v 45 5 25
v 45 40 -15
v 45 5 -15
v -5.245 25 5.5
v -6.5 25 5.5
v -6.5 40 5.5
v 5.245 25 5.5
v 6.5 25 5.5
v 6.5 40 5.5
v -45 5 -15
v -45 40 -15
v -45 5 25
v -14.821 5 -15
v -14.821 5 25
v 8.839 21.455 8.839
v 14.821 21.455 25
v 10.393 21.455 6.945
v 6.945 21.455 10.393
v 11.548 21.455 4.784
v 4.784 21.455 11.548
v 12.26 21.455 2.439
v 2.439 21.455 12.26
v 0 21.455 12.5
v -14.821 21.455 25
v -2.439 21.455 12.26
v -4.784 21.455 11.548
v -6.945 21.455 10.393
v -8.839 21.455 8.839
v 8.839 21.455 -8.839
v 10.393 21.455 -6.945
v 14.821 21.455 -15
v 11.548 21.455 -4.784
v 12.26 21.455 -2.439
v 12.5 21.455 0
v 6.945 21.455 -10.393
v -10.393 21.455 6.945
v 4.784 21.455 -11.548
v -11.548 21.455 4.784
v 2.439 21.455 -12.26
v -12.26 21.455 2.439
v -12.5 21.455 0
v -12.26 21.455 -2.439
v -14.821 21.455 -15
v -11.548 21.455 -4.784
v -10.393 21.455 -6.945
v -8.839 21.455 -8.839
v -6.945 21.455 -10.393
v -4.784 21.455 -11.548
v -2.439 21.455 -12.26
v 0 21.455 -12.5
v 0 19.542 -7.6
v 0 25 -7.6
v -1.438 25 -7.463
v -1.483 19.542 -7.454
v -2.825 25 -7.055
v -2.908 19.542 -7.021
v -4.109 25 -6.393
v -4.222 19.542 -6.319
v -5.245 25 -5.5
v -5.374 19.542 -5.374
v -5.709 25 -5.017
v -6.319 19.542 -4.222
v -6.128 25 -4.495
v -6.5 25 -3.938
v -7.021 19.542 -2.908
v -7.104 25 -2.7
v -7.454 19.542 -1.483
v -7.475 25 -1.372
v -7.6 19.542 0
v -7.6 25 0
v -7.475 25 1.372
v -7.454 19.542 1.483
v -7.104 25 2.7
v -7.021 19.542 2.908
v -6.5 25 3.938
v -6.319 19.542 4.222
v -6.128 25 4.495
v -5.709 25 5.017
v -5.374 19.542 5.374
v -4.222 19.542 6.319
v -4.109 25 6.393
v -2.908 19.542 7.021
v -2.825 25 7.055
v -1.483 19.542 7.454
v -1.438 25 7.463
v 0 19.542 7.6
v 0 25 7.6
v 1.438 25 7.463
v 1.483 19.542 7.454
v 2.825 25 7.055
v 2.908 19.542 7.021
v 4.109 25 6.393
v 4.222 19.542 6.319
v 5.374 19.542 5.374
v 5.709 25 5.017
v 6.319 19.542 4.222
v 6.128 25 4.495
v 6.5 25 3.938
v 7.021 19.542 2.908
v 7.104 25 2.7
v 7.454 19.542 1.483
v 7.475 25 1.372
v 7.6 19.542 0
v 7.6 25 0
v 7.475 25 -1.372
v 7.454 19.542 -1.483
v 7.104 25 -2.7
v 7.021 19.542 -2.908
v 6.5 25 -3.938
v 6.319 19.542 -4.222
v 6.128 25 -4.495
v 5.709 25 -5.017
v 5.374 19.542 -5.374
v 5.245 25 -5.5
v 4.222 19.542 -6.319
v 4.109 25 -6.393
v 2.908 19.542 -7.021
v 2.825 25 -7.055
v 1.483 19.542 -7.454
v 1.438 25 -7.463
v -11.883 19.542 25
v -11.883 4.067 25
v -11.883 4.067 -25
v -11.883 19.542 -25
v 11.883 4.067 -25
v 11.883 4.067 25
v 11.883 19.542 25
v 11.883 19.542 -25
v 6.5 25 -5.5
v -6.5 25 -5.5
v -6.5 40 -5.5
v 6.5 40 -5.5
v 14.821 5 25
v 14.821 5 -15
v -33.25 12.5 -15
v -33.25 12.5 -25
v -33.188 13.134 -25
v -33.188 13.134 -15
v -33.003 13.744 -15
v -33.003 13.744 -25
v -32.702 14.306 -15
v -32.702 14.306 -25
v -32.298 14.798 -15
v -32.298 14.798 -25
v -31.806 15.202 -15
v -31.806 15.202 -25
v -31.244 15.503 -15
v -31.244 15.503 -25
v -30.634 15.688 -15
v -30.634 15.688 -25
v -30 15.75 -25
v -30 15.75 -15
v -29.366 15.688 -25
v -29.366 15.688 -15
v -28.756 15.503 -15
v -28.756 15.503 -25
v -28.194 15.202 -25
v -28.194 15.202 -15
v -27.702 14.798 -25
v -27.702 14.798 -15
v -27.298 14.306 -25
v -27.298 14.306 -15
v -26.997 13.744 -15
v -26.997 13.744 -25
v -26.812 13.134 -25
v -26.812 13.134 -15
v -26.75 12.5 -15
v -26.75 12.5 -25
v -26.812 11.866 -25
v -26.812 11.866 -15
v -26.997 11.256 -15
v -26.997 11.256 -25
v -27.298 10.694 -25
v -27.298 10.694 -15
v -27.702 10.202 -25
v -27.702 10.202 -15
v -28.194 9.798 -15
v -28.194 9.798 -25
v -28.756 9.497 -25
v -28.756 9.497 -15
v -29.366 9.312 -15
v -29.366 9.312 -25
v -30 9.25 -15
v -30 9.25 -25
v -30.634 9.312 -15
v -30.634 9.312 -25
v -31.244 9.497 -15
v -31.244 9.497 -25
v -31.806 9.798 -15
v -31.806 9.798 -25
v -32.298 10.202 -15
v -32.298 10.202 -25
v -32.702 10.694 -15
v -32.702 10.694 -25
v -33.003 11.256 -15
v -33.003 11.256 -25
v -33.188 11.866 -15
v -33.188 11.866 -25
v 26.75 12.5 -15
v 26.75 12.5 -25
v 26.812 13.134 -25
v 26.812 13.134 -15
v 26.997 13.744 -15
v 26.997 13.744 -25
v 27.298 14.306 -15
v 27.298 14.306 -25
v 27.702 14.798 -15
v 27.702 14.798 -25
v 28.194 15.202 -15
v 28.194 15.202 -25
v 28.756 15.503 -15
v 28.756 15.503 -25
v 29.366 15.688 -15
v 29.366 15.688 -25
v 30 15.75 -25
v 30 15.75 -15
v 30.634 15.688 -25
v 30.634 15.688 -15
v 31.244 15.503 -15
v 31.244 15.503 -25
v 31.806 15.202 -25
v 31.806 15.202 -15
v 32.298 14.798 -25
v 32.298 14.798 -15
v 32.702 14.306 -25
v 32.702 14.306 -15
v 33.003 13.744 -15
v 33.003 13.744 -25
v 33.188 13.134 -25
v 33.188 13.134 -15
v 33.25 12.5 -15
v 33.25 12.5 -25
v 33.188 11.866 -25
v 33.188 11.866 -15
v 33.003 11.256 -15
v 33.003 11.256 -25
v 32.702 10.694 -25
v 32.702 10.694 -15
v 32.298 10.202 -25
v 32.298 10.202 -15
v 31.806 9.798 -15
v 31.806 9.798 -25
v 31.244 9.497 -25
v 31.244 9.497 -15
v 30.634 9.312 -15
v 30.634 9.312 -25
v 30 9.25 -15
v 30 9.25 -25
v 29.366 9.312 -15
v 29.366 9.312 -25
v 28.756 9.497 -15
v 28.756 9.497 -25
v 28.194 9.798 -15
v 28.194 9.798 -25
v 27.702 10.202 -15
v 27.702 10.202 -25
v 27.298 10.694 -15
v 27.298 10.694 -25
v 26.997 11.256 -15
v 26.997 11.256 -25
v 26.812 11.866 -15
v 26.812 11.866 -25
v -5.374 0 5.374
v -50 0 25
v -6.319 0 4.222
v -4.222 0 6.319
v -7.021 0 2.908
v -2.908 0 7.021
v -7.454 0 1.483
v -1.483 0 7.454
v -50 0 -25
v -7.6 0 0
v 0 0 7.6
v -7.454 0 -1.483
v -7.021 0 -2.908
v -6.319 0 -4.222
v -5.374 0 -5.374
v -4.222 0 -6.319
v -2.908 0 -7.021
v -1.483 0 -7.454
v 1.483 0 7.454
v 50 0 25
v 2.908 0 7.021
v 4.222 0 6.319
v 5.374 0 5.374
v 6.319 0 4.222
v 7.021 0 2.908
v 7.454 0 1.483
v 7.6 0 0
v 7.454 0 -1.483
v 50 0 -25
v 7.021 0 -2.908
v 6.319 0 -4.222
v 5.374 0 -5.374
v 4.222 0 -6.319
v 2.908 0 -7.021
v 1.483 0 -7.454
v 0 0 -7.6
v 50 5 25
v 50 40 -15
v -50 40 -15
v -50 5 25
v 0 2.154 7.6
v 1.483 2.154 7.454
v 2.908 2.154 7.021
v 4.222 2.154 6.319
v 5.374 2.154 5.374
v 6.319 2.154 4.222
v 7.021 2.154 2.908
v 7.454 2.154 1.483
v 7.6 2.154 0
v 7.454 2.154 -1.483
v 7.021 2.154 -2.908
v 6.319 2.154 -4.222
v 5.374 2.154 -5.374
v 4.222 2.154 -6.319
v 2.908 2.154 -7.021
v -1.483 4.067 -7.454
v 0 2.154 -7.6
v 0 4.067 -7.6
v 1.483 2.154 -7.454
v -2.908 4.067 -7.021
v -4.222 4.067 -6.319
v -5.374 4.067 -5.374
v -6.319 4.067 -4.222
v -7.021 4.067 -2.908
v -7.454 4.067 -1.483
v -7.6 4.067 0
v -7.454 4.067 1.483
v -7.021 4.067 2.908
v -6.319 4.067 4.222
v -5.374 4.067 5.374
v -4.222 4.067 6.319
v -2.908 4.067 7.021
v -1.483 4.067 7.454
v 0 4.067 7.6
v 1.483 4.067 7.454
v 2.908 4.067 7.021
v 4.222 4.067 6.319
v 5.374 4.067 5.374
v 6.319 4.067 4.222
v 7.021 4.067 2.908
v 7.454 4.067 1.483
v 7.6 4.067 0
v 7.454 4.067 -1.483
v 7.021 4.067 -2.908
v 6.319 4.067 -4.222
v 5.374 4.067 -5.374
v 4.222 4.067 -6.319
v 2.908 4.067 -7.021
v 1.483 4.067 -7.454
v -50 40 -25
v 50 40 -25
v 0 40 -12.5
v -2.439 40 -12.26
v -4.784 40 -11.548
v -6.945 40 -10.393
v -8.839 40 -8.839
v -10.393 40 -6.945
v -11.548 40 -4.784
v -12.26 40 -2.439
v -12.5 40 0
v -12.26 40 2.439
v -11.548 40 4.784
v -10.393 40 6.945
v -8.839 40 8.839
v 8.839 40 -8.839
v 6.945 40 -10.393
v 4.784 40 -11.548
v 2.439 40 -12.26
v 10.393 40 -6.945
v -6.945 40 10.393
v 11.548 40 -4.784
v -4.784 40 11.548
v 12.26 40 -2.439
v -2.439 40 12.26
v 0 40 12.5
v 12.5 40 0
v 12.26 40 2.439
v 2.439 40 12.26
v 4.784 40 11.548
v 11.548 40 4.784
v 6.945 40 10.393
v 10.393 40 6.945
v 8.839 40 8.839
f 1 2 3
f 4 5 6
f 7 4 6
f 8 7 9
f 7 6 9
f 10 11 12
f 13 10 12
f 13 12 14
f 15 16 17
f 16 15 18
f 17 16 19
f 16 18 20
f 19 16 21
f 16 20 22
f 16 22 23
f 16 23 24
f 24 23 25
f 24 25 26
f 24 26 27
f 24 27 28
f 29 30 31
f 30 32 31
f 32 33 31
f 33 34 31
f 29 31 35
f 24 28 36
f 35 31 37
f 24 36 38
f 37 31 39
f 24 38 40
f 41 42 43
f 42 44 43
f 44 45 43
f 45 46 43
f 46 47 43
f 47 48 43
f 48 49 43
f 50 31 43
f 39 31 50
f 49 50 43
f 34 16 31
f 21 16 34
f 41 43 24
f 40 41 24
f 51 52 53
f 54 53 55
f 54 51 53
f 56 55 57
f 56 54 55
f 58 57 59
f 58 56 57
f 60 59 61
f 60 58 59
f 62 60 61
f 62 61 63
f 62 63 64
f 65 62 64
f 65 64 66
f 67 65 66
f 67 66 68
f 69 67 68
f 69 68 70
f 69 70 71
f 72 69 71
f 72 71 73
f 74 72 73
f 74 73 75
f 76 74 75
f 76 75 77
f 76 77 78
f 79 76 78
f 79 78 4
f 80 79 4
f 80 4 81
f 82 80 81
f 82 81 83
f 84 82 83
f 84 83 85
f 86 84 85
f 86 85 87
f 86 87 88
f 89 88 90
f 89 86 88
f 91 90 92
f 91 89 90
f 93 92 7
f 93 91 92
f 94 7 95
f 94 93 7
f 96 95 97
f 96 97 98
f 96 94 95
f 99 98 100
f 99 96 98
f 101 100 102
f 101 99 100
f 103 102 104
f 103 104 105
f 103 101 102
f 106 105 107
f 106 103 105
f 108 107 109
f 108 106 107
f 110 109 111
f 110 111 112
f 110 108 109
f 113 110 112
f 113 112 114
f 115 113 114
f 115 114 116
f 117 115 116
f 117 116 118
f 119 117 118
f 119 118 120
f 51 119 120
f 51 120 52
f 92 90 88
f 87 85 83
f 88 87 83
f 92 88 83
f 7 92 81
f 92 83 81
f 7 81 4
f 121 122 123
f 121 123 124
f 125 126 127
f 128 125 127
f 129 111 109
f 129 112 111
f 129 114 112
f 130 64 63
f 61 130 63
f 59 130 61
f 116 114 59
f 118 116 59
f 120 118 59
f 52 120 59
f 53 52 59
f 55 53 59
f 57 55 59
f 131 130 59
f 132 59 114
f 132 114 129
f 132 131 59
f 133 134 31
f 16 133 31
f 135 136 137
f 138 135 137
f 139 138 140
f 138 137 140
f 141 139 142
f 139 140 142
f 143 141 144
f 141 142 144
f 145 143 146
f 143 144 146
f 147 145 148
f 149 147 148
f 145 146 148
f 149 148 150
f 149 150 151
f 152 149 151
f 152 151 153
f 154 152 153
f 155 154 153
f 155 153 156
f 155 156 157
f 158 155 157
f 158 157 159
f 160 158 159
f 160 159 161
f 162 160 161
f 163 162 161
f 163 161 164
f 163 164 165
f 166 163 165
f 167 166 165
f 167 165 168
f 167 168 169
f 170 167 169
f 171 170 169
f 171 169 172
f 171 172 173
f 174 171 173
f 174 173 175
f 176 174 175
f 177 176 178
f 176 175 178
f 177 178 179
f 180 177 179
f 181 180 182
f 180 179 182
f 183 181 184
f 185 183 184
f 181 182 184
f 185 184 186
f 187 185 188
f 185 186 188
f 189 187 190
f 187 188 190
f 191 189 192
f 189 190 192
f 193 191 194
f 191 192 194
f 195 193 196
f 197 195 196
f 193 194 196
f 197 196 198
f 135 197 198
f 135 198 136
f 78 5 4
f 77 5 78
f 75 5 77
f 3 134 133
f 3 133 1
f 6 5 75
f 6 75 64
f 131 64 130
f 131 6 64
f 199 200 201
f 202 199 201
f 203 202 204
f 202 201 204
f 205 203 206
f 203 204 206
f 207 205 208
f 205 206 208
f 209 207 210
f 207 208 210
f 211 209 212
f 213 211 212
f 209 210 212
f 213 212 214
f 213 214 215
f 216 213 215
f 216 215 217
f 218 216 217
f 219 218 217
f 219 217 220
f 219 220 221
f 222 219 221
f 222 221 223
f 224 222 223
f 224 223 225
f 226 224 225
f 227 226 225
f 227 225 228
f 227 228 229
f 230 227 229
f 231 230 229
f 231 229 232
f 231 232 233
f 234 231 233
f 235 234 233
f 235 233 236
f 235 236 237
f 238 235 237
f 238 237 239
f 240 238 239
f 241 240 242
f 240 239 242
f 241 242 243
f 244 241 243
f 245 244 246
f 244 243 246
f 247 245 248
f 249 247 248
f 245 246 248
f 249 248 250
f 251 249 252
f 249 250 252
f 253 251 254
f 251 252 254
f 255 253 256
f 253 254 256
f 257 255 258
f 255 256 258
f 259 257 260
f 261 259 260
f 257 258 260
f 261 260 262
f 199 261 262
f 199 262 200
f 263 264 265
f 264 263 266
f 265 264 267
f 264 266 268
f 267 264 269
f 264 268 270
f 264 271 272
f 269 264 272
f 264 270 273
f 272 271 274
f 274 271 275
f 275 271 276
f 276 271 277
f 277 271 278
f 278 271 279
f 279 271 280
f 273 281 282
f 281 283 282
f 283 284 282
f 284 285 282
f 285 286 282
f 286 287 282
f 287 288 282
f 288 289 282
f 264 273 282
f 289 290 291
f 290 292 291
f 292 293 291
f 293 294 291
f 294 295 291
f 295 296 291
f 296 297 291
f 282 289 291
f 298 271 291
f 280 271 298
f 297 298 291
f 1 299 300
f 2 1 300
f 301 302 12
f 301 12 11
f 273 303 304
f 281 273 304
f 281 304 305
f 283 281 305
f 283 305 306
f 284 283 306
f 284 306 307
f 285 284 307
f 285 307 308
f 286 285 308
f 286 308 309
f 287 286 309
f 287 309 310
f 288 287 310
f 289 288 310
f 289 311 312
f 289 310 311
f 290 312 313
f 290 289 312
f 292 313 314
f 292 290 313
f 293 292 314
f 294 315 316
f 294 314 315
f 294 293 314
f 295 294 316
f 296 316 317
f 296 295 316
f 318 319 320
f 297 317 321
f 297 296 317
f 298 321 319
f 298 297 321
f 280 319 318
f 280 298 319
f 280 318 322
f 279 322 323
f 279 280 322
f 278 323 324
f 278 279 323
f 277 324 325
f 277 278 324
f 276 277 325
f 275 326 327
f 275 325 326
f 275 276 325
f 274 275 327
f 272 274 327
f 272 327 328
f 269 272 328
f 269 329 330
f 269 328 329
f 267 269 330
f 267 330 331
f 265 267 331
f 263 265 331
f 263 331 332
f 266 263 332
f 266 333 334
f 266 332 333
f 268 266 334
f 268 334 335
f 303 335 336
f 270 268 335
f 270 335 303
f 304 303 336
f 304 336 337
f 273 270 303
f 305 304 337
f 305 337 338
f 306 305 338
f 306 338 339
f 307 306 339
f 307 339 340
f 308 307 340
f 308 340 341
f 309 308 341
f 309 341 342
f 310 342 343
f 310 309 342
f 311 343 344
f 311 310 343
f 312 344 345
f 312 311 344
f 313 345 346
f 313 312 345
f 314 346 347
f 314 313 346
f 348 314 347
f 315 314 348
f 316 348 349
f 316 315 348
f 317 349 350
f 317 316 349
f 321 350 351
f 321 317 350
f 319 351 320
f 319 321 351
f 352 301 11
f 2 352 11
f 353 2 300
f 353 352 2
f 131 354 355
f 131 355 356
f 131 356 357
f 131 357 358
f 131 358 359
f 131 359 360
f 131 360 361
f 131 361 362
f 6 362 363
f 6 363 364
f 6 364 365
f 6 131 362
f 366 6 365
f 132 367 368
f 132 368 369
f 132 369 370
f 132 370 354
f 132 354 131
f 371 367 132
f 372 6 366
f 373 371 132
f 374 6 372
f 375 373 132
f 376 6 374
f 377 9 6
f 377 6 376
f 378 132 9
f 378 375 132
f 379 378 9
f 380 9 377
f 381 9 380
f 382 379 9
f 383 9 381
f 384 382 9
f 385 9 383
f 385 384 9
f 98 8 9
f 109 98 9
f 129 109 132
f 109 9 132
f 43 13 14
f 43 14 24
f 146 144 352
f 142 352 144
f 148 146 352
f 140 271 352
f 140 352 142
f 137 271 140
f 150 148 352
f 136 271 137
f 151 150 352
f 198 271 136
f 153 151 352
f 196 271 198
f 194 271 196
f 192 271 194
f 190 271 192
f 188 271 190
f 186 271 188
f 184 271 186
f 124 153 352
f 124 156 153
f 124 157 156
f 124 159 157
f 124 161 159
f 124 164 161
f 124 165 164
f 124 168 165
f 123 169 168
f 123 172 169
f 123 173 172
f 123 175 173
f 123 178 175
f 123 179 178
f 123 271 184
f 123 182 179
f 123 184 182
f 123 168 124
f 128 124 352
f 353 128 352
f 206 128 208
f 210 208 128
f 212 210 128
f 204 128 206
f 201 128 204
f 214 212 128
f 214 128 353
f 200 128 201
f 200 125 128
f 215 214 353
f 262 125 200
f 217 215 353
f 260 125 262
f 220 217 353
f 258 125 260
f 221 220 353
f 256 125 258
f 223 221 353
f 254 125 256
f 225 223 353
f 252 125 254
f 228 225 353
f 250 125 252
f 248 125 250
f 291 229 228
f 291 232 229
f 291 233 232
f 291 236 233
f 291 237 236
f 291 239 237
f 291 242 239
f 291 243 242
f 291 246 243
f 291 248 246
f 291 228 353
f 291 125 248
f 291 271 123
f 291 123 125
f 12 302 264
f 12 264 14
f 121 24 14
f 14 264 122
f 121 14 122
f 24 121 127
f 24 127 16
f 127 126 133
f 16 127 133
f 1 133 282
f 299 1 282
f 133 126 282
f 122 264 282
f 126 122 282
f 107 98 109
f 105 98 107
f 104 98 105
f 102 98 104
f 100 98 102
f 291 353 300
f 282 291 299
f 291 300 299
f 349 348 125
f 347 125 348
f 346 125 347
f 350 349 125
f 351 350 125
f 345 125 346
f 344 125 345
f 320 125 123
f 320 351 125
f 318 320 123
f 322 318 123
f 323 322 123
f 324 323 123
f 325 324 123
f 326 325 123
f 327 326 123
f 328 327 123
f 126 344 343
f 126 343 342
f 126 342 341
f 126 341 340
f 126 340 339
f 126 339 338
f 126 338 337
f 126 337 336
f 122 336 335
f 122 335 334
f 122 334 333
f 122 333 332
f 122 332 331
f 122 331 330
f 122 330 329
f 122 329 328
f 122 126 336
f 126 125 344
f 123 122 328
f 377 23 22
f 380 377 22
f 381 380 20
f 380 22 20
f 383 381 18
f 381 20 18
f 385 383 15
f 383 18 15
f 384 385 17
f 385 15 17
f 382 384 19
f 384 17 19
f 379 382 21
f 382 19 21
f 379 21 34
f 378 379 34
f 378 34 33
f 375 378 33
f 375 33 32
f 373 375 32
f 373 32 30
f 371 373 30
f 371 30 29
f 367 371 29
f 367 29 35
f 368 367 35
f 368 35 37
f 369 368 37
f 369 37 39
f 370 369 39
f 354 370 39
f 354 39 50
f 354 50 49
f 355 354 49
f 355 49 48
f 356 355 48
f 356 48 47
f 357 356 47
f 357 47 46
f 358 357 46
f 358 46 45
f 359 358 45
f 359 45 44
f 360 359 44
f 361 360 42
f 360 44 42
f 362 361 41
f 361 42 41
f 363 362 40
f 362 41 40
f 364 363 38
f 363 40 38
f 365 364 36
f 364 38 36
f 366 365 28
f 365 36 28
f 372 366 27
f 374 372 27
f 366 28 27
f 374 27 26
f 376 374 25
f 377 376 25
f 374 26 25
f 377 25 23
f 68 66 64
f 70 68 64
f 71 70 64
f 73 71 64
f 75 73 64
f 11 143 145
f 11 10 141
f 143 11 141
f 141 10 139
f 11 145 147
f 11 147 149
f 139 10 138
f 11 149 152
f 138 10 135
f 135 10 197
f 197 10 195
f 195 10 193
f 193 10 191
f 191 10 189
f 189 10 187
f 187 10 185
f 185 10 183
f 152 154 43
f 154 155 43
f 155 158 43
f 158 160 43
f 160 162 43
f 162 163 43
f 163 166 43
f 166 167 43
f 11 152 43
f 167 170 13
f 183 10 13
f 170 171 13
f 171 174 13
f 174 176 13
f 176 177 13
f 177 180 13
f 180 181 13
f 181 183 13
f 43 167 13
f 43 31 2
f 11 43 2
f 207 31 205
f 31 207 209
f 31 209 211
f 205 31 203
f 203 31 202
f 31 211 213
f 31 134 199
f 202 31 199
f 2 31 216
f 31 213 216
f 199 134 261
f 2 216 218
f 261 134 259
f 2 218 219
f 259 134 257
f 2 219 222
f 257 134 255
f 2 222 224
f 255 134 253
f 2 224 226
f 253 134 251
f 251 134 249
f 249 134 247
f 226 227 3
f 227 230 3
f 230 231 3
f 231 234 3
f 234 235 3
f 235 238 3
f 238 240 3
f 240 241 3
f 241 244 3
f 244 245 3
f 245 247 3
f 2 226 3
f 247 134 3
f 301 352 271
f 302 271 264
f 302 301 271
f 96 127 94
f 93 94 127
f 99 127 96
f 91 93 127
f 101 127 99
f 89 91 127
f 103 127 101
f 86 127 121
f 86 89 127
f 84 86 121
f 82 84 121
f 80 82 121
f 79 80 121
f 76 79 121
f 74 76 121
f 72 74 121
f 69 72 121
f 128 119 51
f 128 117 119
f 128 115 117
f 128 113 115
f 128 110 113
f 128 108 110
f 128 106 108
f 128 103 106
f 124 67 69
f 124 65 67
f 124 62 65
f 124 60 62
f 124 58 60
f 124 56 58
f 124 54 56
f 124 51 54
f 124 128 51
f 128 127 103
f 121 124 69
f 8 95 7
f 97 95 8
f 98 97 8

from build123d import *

# Parameters (mm, degrees)
SKETCH1_W               = 100
SKETCH1_H               = 40
SKETCH1_R               = 7.6
BOSS_EXTRUDE4_DEPTH     = 5
SKETCH9_R               = 12.5
BOSS_EXTRUDE7_DEPTH     = 35
SKETCH1_7_W             = 100
SKETCH1_7_H             = 10
EXTRUDE_THIN1_DEPTH     = 40
BOSS_EXTRUDE5_DEPTH     = 5
BOSS_EXTRUDE6_DEPTH     = 5
SKETCH11_W              = 13
SKETCH11_H              = 11
CUT_EXTRUDE2_DEPTH      = 15
SKETCH13_5_R            = 3.25
CUT_EXTRUDE4_DEPTH      = 205
SKETCH13_R              = 3.25
CUT_EXTRUDE5_DEPTH      = 205
SKETCH15_W              = 29.641034448
SKETCH15_H              = 19.301138711
SKETCH15_W_2            = 23.765799192
SKETCH15_H_2            = 15.475404125
BOSS_EXTRUDE11_DEPTH    = 50
CUT_EXTRUDE6_DEPTH      = 32
CUT_EXTRUDE6_DEPTH_BACK = 66
SKETCH16_W              = 23.765799192
SKETCH16_H              = 15.475404125
SKETCH1_11_R            = 7.6
CUT_EXTRUDE1_DEPTH      = 25


with BuildPart() as part:
    # Sketch1 → Boss-Extrude4 (new body)
    with BuildSketch(Plane(origin=(0, 0, 0), x_dir=(1, 0, 0), z_dir=(0, 1, 0))):
        with Locations((0, -5)):
            Rectangle(SKETCH1_W, SKETCH1_H)
        Circle(SKETCH1_R, mode=Mode.SUBTRACT)
    extrude(amount=BOSS_EXTRUDE4_DEPTH)

    # Sketch9 → Boss-Extrude7 (add)
    with BuildSketch(Plane(origin=(0, 5, 0), x_dir=(1, 0, 0), z_dir=(0, 1, 0))):
        Circle(SKETCH9_R)
    extrude(amount=BOSS_EXTRUDE7_DEPTH)

    # Sketch1<7> → Extrude-Thin1 (add)
    with BuildSketch(Plane(origin=(0, 0, 0), x_dir=(1, 0, 0), z_dir=(0, 1, 0))):
        with Locations((0, 20)):
            Rectangle(SKETCH1_7_W, SKETCH1_7_H)
    extrude(amount=EXTRUDE_THIN1_DEPTH)

    # Sketch5 → Boss-Extrude5 (add)
    with BuildSketch(Plane(origin=(50, 0, 0), x_dir=(0, 0, -1), z_dir=(1, 0, 0))):
        Polygon((15, 40), (15, 5), (-25, 5), align=None)
    extrude(amount=-BOSS_EXTRUDE5_DEPTH)

    # Sketch6 → Boss-Extrude6 (add)
    with BuildSketch(Plane.ZY.offset(50)):
        Polygon((-15, 40), (-15, 5), (25, 5), align=None)
    extrude(amount=-BOSS_EXTRUDE6_DEPTH)

    # Sketch11 → Cut-Extrude2 (cut)
    with BuildSketch(Plane(origin=(0, 40, 0), x_dir=(1, 0, 0), z_dir=(0, 1, 0))):
        Rectangle(SKETCH11_W, SKETCH11_H)
    extrude(amount=-CUT_EXTRUDE2_DEPTH, mode=Mode.SUBTRACT)

    # Sketch13<5> → Cut-Extrude4 (cut)
    with BuildSketch(Plane(origin=(0, 0, -25), x_dir=(-1, 0, 0), z_dir=(0, 0, -1))):
        with Locations((30, 12.5)):
            Circle(SKETCH13_5_R)
    extrude(amount=-CUT_EXTRUDE4_DEPTH, mode=Mode.SUBTRACT)

    # Sketch13 → Cut-Extrude5 (cut)
    with BuildSketch(Plane(origin=(0, 0, -25), x_dir=(-1, 0, 0), z_dir=(0, 0, -1))):
        with Locations((-30, 12.5)):
            Circle(SKETCH13_R)
    extrude(amount=-CUT_EXTRUDE5_DEPTH, mode=Mode.SUBTRACT)

    # Sketch15 → Boss-Extrude11 (add)
    with BuildSketch(Plane(origin=(0, 0, -25), x_dir=(-1, 0, 0), z_dir=(0, 0, -1))):
        with Locations((0, 11.804714301)):
            Rectangle(SKETCH15_W, SKETCH15_H)
        with Locations((0, 11.804714301)):
            Rectangle(SKETCH15_W_2, SKETCH15_H_2, mode=Mode.SUBTRACT)
    extrude(amount=-BOSS_EXTRUDE11_DEPTH)

    # Sketch16 → Cut-Extrude6 (cut, two sides: drawn at the far end of the back side and taken through both)
    with BuildSketch(Plane(origin=(0, 0, -25), x_dir=(-1, 0, 0), z_dir=(0, 0, -1)).offset(-CUT_EXTRUDE6_DEPTH_BACK)):
        with Locations((0, 11.804714301)):
            Rectangle(SKETCH16_W, SKETCH16_H)
    extrude(amount=CUT_EXTRUDE6_DEPTH + CUT_EXTRUDE6_DEPTH_BACK, mode=Mode.SUBTRACT)

    # Sketch1<11> → Cut-Extrude1 (cut)
    with BuildSketch(Plane(origin=(0, 0, 0), x_dir=(1, 0, 0), z_dir=(0, 1, 0))):
        Circle(SKETCH1_11_R)
    extrude(amount=CUT_EXTRUDE1_DEPTH, mode=Mode.SUBTRACT)


solid = part.part
